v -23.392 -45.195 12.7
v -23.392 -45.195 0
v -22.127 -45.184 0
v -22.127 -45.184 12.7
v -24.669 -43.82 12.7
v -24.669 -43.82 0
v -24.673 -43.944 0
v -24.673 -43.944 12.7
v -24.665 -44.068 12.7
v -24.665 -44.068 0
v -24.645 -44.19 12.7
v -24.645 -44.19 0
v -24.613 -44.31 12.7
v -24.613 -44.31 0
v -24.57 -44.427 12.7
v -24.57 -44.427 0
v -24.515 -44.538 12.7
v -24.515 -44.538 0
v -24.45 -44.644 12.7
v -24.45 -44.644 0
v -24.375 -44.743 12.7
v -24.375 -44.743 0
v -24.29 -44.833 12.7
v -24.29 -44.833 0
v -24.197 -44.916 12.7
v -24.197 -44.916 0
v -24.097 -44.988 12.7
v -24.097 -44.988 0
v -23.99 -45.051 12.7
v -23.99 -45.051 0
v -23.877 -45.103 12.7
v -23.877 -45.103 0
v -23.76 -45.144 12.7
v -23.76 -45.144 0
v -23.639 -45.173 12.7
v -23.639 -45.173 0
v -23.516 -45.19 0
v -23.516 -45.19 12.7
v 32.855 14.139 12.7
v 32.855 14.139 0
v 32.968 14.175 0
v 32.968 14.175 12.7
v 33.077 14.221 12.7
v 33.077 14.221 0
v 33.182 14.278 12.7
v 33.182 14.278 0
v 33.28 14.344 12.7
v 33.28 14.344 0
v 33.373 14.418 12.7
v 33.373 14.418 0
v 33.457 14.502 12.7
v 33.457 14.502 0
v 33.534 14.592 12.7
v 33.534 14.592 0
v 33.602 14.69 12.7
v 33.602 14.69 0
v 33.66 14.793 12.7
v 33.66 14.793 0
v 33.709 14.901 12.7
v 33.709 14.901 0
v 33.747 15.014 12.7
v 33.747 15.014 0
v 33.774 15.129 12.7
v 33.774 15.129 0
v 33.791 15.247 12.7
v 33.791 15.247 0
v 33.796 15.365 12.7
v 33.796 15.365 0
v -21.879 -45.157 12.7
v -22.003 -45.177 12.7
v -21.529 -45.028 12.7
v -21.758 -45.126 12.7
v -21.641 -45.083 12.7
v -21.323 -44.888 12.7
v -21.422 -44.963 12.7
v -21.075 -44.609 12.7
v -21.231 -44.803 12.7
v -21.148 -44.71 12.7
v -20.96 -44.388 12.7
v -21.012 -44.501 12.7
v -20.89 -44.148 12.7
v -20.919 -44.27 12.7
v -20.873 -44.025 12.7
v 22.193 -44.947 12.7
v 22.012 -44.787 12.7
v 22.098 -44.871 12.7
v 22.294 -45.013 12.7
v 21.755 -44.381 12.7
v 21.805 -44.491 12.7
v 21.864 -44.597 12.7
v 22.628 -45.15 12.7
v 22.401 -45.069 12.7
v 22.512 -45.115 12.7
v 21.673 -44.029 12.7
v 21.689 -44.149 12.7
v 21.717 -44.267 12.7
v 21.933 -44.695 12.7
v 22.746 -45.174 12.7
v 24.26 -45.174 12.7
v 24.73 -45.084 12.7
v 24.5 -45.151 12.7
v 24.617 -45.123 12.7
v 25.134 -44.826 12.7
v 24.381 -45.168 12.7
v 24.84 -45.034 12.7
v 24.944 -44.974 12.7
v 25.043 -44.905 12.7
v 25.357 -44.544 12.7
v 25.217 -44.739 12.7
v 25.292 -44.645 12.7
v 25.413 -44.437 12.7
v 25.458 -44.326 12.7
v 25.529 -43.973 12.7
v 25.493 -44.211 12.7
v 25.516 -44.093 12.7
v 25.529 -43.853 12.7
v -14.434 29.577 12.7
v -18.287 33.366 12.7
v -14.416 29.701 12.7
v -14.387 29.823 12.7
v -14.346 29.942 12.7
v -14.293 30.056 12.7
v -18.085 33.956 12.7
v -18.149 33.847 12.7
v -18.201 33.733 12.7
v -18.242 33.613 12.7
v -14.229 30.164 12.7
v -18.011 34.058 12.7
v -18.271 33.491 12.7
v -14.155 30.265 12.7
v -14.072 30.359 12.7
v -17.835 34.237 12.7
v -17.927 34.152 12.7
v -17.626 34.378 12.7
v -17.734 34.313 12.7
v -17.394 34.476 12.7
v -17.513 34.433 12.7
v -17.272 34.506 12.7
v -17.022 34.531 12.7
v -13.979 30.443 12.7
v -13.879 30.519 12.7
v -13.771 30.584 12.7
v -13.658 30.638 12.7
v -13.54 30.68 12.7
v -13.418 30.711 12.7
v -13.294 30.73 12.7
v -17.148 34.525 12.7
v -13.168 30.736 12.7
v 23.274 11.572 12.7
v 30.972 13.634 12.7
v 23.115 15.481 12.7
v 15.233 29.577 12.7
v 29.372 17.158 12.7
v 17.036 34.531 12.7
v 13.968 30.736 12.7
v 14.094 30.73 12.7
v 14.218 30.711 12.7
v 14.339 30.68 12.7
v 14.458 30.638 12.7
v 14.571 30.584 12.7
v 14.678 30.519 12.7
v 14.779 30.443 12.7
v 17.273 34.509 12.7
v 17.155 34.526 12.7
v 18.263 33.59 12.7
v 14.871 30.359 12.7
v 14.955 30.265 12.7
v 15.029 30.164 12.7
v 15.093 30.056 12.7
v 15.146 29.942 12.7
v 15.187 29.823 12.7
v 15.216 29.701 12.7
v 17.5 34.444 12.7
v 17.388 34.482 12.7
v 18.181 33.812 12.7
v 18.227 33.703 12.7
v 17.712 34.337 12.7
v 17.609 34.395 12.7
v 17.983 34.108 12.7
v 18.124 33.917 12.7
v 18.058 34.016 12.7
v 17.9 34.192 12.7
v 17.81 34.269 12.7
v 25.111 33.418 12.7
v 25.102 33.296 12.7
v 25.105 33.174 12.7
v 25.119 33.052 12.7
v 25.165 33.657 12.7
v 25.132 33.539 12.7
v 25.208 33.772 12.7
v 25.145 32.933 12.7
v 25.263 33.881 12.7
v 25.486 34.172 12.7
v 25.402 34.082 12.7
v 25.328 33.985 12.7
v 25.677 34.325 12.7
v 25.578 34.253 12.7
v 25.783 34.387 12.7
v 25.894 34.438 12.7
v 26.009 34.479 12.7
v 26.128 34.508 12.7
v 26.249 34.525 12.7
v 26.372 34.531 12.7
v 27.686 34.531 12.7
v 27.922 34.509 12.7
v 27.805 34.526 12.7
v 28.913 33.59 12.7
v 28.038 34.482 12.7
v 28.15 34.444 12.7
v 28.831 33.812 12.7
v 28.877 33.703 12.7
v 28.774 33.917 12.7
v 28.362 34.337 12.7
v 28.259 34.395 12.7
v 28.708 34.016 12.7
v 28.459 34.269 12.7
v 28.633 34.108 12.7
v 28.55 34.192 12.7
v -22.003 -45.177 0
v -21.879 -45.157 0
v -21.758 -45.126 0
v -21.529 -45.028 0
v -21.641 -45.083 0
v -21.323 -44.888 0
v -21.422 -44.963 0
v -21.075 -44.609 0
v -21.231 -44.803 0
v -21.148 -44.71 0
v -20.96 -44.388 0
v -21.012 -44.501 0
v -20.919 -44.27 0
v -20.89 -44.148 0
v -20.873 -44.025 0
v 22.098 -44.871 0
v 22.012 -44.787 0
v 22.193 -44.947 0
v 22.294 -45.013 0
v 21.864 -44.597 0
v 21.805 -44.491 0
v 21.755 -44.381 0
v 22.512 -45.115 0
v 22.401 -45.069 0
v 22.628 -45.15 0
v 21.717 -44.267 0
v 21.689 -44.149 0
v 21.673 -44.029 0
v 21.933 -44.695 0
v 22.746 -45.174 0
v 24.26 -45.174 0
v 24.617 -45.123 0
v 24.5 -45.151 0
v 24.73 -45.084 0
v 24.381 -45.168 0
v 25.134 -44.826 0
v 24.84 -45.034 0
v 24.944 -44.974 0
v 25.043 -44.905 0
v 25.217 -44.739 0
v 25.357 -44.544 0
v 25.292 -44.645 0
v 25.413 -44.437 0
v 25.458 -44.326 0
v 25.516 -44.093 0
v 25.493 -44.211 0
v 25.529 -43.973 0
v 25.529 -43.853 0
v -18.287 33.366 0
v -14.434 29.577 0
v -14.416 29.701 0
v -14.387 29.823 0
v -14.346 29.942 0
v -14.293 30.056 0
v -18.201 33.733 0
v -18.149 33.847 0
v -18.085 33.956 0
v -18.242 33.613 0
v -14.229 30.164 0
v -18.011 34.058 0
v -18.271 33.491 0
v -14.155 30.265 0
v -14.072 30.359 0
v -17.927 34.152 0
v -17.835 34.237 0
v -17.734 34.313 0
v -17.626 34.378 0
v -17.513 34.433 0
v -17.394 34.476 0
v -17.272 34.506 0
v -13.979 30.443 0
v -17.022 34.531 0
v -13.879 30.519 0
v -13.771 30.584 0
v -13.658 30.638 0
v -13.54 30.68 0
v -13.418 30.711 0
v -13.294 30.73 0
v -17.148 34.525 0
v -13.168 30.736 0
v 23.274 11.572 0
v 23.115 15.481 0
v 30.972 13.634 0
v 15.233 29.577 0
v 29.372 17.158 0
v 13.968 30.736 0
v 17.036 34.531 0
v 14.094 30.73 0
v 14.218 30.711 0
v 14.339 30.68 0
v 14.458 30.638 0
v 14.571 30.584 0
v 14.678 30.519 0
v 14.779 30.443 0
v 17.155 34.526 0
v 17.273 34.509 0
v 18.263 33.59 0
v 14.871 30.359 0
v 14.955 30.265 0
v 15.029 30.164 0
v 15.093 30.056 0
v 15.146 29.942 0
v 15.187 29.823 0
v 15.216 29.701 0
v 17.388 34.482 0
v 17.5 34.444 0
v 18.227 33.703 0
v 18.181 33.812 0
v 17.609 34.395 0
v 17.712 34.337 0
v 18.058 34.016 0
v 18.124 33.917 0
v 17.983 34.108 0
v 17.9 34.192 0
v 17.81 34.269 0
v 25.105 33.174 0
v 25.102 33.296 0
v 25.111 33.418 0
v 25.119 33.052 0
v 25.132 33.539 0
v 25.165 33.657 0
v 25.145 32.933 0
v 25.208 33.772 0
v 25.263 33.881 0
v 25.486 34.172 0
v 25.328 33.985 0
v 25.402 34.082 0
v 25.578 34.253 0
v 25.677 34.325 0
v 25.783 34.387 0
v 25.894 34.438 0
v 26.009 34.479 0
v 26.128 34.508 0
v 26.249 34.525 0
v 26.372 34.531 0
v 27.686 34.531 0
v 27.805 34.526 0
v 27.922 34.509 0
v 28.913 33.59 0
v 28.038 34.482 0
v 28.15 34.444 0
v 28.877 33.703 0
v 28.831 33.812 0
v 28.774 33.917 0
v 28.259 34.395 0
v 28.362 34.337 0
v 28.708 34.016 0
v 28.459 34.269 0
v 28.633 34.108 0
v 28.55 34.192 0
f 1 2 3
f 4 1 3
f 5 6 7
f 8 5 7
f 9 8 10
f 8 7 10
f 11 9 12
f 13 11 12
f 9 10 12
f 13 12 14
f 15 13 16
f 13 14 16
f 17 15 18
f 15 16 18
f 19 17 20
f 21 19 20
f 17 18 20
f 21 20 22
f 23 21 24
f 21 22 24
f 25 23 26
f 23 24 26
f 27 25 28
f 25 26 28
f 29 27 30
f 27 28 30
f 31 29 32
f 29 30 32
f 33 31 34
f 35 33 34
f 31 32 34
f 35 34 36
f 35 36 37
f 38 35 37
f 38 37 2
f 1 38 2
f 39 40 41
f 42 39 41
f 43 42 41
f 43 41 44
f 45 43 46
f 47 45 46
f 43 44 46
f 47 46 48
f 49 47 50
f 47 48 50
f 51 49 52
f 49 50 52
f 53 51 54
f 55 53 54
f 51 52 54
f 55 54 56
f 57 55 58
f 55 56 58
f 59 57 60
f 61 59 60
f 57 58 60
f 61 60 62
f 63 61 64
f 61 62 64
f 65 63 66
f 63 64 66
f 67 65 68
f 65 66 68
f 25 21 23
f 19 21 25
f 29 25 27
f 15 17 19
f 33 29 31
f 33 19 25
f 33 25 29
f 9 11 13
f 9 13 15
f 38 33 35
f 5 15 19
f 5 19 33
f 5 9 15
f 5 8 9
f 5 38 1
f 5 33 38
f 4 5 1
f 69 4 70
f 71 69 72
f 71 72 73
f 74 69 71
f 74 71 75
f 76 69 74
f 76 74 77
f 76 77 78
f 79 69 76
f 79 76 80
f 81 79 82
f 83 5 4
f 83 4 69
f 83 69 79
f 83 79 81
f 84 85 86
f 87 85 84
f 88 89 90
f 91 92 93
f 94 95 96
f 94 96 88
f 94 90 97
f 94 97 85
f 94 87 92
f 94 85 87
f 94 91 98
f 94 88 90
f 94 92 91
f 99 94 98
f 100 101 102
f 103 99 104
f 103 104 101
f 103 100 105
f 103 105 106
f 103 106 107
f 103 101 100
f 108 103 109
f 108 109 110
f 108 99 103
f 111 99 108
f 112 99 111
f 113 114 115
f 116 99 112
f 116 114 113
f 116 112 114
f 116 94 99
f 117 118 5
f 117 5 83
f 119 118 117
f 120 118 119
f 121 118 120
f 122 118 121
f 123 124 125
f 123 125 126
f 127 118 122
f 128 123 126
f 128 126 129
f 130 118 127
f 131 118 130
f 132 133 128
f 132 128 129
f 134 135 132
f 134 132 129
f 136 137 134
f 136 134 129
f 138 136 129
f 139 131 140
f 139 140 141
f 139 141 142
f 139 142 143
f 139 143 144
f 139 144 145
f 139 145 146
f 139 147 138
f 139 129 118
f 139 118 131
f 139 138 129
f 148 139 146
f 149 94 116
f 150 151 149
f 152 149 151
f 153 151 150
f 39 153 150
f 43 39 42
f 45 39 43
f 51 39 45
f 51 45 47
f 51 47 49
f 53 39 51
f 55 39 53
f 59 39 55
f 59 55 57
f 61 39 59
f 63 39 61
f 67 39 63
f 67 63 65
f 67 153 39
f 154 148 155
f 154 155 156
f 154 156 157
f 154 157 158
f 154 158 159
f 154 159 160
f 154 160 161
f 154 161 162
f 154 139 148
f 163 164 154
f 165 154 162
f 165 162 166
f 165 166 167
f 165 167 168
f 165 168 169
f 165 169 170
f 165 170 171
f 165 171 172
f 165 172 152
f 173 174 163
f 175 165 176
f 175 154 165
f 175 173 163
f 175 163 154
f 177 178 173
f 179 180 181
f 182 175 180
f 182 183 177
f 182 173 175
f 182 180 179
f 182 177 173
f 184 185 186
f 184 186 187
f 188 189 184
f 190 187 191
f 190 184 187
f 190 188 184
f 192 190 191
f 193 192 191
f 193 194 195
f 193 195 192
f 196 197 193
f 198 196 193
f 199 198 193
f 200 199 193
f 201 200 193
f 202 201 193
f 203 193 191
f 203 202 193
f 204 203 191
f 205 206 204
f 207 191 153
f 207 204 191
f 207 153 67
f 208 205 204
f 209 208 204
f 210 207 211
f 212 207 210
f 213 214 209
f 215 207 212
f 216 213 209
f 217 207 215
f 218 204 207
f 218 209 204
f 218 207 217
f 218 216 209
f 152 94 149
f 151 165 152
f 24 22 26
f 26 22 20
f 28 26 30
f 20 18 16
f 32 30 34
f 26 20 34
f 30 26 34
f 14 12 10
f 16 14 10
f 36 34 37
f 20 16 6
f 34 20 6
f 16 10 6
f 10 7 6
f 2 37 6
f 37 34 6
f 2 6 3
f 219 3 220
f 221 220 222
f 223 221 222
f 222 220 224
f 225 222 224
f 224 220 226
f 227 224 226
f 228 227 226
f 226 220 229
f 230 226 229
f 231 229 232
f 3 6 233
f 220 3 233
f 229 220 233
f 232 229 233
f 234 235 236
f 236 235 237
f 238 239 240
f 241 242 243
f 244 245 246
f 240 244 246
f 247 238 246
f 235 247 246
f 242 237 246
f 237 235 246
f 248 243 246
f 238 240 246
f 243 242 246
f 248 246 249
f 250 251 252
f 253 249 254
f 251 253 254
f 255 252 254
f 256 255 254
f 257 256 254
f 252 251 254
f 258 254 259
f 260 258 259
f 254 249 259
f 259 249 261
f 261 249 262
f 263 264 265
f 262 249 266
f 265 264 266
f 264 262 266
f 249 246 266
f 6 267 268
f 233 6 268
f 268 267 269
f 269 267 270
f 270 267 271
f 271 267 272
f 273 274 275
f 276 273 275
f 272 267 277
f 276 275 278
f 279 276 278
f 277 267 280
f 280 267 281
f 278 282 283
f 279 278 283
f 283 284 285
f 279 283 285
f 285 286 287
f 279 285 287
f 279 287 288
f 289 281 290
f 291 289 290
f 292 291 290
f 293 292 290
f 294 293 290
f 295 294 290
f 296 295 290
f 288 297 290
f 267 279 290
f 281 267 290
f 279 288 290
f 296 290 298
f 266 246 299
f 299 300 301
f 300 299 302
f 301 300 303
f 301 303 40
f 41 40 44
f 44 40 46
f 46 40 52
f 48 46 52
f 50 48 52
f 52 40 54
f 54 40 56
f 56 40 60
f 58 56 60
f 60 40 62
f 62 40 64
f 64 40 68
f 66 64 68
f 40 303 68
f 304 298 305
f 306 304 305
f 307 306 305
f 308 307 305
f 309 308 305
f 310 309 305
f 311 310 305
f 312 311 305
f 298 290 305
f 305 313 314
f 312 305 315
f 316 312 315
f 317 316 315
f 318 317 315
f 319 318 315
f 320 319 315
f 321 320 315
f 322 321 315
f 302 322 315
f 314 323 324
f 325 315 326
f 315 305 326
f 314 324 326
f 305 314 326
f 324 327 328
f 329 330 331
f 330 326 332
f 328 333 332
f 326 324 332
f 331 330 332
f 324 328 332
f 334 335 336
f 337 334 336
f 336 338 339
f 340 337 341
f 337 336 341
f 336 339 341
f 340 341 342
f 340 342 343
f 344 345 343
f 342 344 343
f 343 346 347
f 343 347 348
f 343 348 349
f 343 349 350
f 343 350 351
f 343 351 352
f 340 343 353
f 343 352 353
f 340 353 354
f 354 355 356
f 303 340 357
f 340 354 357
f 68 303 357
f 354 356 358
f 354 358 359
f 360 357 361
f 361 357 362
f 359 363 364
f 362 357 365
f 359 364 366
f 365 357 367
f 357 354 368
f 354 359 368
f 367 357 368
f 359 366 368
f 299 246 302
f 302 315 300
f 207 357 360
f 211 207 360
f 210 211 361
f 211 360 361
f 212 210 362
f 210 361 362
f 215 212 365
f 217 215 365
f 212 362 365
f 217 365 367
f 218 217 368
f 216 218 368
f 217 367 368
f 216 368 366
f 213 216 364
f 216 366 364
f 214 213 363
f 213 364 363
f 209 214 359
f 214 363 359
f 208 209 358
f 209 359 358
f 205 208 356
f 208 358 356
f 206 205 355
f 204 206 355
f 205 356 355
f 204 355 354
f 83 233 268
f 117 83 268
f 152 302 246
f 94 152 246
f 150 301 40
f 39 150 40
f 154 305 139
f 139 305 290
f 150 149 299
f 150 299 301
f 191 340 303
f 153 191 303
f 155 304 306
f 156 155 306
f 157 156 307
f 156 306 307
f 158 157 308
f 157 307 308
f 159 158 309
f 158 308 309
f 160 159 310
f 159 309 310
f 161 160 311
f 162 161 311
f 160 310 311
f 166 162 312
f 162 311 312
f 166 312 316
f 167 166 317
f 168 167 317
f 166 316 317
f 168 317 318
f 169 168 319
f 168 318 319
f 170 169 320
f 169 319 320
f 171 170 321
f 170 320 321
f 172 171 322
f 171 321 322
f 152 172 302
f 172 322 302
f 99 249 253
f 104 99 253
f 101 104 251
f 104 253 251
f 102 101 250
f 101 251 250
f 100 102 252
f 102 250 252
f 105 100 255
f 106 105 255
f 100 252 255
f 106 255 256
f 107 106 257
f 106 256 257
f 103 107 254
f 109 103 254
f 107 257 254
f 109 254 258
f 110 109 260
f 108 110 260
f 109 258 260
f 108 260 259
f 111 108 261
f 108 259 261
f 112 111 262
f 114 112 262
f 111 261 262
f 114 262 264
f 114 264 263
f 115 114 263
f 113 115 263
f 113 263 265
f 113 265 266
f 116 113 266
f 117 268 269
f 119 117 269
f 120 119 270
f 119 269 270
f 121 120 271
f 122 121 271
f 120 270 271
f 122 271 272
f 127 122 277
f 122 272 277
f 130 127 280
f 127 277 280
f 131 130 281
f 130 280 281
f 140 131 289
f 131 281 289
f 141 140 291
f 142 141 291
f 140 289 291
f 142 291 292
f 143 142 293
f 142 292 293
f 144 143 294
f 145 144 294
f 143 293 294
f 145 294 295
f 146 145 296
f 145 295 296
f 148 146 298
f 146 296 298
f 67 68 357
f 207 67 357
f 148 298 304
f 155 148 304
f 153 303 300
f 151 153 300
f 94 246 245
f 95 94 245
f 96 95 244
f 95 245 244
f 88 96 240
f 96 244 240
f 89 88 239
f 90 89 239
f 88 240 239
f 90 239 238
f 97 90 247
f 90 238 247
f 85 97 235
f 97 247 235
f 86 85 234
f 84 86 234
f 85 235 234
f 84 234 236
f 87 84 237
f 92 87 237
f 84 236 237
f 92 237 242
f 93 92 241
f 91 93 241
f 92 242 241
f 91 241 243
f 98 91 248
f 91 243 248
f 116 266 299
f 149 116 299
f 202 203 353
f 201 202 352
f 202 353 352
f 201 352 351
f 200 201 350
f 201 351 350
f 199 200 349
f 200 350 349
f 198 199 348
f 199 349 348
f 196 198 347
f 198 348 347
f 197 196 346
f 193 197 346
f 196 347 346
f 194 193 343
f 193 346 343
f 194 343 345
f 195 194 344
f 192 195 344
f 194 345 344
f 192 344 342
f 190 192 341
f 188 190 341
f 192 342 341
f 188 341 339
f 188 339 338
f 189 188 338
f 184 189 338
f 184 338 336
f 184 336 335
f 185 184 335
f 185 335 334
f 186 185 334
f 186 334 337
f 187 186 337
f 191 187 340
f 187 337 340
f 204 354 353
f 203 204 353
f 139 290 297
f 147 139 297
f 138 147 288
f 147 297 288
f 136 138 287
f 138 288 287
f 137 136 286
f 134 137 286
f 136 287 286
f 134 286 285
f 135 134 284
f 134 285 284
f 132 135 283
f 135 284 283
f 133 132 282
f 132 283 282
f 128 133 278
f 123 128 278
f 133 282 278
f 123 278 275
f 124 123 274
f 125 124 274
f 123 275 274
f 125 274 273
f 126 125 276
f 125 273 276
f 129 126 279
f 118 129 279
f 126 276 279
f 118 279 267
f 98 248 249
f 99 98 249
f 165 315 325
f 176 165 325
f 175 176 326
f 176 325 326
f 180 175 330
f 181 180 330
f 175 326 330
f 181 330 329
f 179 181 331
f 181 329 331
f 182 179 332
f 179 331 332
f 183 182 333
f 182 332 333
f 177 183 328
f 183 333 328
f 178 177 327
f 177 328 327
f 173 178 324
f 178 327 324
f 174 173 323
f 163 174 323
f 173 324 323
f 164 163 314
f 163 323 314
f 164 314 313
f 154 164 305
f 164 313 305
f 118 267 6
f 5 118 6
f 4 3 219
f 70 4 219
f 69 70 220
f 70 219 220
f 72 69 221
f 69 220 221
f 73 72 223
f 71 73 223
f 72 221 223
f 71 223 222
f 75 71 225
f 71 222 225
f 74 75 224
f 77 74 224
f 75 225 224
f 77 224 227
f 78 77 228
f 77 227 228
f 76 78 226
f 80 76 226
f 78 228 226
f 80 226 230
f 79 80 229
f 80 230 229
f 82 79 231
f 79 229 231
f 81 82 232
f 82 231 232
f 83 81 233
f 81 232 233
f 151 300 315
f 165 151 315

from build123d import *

# Parameters (mm, degrees)
F1_DEPTH = 12.7


with BuildPart() as f1:
    # F0 (on Top) → F1 (new body)
    with BuildSketch(Plane.XY):
        with BuildLine():
            ThreePointArc((-14.433566, 29.576561), (-14.026399, 30.402215), (-13.168399, 30.735873))
            Line((-13.168399, 30.735873), (13.96812, 30.735873))
            ThreePointArc((13.96812, 30.735873), (14.826119, 30.402215), (15.233287, 29.576561))
            Line((15.233287, 29.576561), (21.672975, -44.029412))
            ThreePointArc((21.672975, -44.029412), (22.011711, -44.787415), (22.74638, -45.174163))
            Line((22.74638, -45.174163), (24.260408, -45.174163))
            ThreePointArc((24.260408, -45.174163), (25.176504, -44.783746), (25.529358, -43.852536))
            Line((25.529358, -43.852536), (23.274442, 11.57156))
            Line((23.274442, 11.57156), (30.972435, 13.634231))
            Line((30.972435, 13.634231), (32.855034, 14.138672))
            ThreePointArc((32.855034, 14.138672), (33.533893, 14.592271), (33.796334, 15.365398))
            Line((33.796334, 15.365398), (28.913047, 33.590075))
            ThreePointArc((28.913047, 33.590075), (28.459448, 34.268934), (27.686321, 34.531375))
            Line((27.686321, 34.531375), (26.37152, 34.531375))
            ThreePointArc((26.37152, 34.531375), (25.363961, 34.034502), (25.144794, 32.932675))
            Line((25.144794, 32.932675), (29.371674, 17.157746))
            Line((29.371674, 17.157746), (23.115372, 15.481375))
            Line((23.115372, 15.481375), (18.26316, 33.590075))
            ThreePointArc((18.26316, 33.590075), (17.809562, 34.268934), (17.036435, 34.531375))
            Line((17.036435, 34.531375), (-17.021739, 34.531375))
            ThreePointArc((-17.021739, 34.531375), (-17.881974, 34.195664), (-18.287421, 33.366013))
            Line((-18.287421, 33.366013), (-24.668649, -43.820158))
            ThreePointArc((-24.668649, -43.820158), (-24.333586, -44.788999), (-23.392157, -45.19475))
            Line((-23.392157, -45.19475), (-22.127202, -45.183983))
            ThreePointArc((-22.127202, -45.183983), (-21.276035, -44.846712), (-20.872844, -44.024717))
            Line((-20.872844, -44.024717), (-14.433566, 29.576561))
        make_face()
    extrude(amount=F1_DEPTH)


solid = f1.part
